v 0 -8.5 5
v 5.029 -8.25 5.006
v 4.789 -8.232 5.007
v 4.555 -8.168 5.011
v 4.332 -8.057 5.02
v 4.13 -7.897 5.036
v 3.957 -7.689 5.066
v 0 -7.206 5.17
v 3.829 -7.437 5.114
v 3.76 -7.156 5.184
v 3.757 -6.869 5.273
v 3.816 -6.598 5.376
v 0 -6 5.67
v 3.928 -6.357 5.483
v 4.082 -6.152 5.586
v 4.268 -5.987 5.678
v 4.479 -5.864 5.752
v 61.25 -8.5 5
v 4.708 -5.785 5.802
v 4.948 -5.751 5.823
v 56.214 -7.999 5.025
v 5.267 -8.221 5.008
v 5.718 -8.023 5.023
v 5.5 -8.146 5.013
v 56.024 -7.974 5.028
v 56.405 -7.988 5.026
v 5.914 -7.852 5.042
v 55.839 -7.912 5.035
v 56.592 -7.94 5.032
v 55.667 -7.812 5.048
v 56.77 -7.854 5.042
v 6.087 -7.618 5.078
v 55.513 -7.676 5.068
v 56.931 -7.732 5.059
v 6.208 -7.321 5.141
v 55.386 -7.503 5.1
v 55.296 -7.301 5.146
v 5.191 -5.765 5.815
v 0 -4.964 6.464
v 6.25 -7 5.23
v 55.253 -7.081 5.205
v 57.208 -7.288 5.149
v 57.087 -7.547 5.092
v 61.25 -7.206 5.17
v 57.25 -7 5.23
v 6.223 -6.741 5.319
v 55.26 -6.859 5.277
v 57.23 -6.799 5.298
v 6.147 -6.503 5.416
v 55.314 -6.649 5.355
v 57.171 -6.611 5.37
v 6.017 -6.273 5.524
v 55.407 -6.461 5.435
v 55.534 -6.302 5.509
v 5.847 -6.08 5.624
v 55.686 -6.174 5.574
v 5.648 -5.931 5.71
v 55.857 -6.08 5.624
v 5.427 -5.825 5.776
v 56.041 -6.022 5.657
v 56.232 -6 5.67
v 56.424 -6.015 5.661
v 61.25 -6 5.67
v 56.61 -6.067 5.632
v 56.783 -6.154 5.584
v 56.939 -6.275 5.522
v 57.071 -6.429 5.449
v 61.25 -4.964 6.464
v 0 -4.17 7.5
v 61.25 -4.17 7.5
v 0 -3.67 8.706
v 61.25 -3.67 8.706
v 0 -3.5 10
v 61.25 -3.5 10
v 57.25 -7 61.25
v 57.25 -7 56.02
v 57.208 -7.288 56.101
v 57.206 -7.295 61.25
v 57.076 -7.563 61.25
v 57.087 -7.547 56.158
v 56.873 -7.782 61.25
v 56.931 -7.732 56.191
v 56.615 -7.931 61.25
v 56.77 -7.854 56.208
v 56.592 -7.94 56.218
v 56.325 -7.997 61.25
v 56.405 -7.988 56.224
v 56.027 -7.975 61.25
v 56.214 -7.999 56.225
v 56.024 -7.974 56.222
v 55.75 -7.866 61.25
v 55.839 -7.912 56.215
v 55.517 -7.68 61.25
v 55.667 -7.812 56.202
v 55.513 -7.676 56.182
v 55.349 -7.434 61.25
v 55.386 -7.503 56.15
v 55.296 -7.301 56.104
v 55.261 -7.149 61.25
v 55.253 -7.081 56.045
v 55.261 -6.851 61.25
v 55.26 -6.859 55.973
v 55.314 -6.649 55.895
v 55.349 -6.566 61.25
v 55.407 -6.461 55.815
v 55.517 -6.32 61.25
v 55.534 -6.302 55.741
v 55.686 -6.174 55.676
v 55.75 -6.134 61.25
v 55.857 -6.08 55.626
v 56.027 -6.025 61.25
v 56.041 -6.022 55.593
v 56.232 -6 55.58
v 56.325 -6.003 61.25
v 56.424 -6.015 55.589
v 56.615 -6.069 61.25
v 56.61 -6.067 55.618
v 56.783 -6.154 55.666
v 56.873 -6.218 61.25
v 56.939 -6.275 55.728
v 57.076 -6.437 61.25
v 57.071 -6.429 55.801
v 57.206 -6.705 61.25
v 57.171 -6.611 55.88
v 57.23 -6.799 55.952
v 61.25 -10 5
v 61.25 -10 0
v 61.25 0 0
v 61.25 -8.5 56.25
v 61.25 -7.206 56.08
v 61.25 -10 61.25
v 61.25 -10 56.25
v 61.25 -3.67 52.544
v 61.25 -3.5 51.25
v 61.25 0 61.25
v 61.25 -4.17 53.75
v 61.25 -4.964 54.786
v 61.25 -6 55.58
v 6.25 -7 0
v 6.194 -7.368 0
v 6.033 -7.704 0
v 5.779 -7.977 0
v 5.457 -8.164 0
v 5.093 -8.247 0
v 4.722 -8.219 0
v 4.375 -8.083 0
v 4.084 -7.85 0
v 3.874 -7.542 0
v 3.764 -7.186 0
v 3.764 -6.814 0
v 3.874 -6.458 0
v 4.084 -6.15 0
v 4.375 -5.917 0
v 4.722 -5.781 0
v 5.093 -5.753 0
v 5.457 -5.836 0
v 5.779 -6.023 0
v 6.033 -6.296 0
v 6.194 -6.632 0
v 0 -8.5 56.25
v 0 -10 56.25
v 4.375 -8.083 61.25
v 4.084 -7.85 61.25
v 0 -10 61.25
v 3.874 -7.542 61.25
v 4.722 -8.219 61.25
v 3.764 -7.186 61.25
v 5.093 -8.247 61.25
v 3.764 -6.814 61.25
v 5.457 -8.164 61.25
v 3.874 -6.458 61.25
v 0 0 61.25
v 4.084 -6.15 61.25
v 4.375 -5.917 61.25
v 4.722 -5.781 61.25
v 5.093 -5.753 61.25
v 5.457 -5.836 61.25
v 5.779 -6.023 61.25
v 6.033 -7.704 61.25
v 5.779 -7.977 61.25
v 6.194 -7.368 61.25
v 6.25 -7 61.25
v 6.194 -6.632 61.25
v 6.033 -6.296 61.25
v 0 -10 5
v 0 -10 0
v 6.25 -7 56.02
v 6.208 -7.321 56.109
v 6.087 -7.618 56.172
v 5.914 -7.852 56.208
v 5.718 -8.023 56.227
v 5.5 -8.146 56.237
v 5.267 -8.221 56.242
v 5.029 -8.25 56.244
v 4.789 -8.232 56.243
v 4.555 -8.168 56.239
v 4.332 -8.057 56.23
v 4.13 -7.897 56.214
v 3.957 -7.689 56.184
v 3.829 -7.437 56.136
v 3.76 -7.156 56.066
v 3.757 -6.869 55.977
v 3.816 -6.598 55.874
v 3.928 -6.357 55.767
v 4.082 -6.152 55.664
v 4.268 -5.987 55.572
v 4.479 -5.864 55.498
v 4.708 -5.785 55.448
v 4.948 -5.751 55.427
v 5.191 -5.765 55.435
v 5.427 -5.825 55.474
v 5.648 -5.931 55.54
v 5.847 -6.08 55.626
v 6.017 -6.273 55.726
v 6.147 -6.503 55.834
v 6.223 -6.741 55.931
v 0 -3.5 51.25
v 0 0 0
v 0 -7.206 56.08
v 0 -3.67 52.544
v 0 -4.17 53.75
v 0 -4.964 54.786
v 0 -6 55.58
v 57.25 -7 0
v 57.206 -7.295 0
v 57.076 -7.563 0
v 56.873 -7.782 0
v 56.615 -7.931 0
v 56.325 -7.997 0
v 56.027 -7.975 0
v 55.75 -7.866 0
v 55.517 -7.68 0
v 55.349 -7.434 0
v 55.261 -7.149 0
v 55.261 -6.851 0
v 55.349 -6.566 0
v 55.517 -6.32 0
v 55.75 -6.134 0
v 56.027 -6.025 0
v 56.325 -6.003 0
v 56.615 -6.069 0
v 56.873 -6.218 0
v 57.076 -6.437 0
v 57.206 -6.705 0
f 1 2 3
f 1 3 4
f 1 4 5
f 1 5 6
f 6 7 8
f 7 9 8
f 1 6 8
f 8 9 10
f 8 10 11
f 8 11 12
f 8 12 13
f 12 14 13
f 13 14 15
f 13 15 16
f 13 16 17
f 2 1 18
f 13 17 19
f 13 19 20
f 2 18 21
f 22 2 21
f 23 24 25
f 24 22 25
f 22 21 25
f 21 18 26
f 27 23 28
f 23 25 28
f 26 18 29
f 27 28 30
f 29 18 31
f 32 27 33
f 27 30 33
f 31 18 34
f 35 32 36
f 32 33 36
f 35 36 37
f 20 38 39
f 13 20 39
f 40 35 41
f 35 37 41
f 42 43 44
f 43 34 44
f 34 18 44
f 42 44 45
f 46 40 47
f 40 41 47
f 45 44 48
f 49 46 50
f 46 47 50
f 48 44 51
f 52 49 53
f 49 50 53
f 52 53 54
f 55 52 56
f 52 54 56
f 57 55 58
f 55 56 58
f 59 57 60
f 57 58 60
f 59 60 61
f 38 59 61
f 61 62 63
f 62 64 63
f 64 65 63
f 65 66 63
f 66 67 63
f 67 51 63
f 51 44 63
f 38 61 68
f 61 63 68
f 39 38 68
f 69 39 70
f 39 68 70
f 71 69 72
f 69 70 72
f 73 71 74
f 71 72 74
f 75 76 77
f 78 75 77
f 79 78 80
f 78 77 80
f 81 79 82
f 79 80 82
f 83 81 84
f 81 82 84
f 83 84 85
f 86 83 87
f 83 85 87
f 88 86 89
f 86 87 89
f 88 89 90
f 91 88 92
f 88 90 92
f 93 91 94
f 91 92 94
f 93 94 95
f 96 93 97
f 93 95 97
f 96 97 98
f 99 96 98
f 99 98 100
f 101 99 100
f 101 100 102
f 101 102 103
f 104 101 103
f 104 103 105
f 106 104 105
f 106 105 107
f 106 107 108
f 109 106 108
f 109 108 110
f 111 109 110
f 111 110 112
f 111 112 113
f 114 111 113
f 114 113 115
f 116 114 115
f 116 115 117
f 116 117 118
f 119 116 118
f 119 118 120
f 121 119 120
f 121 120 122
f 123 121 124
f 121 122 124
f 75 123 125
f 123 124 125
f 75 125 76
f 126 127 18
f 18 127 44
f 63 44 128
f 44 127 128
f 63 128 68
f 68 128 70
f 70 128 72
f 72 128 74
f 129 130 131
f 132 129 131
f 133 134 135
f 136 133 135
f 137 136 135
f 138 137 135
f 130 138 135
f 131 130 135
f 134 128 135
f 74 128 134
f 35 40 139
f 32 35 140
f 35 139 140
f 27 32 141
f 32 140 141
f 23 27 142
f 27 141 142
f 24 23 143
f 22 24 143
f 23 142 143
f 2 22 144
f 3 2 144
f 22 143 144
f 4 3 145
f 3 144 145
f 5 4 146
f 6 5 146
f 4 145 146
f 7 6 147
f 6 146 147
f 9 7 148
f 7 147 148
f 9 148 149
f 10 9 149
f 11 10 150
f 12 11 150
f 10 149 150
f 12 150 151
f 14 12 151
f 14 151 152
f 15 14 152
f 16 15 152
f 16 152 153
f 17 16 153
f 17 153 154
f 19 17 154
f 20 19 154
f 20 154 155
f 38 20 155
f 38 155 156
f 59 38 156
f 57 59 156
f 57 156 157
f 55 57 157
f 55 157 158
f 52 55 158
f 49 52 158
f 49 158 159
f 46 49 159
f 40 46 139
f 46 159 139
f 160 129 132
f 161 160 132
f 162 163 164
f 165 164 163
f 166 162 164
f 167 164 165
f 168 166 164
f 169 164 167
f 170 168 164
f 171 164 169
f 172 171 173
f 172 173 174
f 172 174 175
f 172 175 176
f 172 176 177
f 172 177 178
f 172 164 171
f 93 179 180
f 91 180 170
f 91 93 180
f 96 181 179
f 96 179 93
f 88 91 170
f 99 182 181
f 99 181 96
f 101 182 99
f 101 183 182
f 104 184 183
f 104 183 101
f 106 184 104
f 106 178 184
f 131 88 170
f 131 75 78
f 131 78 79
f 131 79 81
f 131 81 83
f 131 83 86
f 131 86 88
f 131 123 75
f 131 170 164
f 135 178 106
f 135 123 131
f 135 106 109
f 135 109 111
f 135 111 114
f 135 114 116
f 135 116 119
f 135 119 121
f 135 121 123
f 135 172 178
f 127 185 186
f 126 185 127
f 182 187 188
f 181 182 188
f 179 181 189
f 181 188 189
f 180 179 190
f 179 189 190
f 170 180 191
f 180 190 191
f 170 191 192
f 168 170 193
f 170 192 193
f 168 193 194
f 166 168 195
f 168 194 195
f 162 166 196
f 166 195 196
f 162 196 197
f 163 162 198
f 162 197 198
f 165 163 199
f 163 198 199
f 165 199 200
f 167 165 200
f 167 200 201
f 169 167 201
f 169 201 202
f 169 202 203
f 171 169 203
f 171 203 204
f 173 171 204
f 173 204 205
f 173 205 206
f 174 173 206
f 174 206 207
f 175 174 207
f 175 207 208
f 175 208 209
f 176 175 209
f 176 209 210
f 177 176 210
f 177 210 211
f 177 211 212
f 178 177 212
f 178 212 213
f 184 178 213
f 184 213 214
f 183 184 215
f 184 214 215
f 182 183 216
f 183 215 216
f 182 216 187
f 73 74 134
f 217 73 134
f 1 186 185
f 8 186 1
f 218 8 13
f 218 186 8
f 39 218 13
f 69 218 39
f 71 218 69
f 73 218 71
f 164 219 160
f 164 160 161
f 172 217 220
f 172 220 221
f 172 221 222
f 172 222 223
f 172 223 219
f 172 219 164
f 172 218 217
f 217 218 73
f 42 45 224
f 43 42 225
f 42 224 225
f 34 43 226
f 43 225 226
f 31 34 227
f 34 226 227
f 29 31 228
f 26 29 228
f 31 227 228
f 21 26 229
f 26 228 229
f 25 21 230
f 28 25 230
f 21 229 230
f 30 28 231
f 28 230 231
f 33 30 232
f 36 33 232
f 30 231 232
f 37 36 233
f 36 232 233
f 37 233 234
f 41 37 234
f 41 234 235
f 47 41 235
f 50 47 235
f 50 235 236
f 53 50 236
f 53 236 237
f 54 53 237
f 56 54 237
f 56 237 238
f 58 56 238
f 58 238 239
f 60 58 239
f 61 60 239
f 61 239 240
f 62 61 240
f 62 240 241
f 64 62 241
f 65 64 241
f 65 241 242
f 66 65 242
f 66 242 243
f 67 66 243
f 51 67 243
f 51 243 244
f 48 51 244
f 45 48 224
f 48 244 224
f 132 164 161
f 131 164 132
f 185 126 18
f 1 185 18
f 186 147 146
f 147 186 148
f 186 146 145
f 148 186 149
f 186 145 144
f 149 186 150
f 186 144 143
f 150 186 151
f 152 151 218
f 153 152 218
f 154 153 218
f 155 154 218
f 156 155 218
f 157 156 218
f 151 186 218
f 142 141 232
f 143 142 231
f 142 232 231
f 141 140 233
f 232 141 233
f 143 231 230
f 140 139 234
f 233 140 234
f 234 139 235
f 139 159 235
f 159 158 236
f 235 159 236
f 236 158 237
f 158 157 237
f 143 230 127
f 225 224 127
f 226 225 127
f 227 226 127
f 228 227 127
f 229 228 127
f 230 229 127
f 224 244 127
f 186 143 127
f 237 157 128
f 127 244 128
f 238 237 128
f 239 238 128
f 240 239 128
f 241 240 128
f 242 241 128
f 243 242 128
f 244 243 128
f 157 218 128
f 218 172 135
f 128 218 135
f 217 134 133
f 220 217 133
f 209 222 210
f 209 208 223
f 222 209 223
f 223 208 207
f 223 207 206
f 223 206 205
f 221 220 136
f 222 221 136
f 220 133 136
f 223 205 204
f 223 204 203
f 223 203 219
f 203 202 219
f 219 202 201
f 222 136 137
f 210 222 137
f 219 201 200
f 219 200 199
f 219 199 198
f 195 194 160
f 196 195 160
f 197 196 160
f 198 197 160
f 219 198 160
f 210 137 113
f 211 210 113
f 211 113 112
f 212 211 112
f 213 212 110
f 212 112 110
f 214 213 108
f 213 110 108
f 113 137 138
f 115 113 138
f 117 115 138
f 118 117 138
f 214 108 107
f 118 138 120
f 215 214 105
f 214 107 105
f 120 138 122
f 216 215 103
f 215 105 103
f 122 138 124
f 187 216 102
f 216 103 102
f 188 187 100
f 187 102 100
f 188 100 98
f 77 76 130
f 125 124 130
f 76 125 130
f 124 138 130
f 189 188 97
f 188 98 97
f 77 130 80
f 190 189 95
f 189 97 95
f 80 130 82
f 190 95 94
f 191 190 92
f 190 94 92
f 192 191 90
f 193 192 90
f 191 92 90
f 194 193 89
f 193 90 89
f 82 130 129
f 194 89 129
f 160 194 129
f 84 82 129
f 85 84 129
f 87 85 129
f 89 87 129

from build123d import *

# Parameters (mm, degrees)
F0_W     = 61.25
F0_H     = 61.25
F1_DEPTH = 10
F3_DEPTH = 80
F4_R     = 1
F4_R_2   = 1.25
F5_DEPTH = 80


with BuildPart() as f1:
    # F0 (on Front) → F1 (new body)
    with BuildSketch(Plane.XZ):
        with Locations((30.625, 30.625)):
            Rectangle(F0_W, F0_H)
    extrude(amount=F1_DEPTH)

    # F2 (on face) → F3 (cut)
    with BuildSketch(Plane.YZ.offset(61.25)):
        with BuildLine():
            Line((-10, 56.25), (-10, 5))
            Line((-10, 5), (-8.5, 5))
            ThreePointArc((-8.5, 5), (-4.964466, 6.464466), (-3.5, 10))
            Line((-3.5, 10), (-3.5, 51.25))
            ThreePointArc((-3.5, 51.25), (-4.964466, 54.785534), (-8.5, 56.25))
            Line((-8.5, 56.25), (-10, 56.25))
        make_face()
    extrude(amount=-F3_DEPTH, mode=Mode.SUBTRACT)

    # F4 (on face) → F5 (cut)
    with BuildSketch(Plane(origin=(0, 0, 0), x_dir=(1, 0, 0), z_dir=(0, 0, -1))):
        with Locations((56.25, 7)):
            Circle(F4_R)
        with Locations((5, 7)):
            Circle(F4_R_2)
    extrude(amount=-F5_DEPTH, mode=Mode.SUBTRACT)


solid = f1.part
